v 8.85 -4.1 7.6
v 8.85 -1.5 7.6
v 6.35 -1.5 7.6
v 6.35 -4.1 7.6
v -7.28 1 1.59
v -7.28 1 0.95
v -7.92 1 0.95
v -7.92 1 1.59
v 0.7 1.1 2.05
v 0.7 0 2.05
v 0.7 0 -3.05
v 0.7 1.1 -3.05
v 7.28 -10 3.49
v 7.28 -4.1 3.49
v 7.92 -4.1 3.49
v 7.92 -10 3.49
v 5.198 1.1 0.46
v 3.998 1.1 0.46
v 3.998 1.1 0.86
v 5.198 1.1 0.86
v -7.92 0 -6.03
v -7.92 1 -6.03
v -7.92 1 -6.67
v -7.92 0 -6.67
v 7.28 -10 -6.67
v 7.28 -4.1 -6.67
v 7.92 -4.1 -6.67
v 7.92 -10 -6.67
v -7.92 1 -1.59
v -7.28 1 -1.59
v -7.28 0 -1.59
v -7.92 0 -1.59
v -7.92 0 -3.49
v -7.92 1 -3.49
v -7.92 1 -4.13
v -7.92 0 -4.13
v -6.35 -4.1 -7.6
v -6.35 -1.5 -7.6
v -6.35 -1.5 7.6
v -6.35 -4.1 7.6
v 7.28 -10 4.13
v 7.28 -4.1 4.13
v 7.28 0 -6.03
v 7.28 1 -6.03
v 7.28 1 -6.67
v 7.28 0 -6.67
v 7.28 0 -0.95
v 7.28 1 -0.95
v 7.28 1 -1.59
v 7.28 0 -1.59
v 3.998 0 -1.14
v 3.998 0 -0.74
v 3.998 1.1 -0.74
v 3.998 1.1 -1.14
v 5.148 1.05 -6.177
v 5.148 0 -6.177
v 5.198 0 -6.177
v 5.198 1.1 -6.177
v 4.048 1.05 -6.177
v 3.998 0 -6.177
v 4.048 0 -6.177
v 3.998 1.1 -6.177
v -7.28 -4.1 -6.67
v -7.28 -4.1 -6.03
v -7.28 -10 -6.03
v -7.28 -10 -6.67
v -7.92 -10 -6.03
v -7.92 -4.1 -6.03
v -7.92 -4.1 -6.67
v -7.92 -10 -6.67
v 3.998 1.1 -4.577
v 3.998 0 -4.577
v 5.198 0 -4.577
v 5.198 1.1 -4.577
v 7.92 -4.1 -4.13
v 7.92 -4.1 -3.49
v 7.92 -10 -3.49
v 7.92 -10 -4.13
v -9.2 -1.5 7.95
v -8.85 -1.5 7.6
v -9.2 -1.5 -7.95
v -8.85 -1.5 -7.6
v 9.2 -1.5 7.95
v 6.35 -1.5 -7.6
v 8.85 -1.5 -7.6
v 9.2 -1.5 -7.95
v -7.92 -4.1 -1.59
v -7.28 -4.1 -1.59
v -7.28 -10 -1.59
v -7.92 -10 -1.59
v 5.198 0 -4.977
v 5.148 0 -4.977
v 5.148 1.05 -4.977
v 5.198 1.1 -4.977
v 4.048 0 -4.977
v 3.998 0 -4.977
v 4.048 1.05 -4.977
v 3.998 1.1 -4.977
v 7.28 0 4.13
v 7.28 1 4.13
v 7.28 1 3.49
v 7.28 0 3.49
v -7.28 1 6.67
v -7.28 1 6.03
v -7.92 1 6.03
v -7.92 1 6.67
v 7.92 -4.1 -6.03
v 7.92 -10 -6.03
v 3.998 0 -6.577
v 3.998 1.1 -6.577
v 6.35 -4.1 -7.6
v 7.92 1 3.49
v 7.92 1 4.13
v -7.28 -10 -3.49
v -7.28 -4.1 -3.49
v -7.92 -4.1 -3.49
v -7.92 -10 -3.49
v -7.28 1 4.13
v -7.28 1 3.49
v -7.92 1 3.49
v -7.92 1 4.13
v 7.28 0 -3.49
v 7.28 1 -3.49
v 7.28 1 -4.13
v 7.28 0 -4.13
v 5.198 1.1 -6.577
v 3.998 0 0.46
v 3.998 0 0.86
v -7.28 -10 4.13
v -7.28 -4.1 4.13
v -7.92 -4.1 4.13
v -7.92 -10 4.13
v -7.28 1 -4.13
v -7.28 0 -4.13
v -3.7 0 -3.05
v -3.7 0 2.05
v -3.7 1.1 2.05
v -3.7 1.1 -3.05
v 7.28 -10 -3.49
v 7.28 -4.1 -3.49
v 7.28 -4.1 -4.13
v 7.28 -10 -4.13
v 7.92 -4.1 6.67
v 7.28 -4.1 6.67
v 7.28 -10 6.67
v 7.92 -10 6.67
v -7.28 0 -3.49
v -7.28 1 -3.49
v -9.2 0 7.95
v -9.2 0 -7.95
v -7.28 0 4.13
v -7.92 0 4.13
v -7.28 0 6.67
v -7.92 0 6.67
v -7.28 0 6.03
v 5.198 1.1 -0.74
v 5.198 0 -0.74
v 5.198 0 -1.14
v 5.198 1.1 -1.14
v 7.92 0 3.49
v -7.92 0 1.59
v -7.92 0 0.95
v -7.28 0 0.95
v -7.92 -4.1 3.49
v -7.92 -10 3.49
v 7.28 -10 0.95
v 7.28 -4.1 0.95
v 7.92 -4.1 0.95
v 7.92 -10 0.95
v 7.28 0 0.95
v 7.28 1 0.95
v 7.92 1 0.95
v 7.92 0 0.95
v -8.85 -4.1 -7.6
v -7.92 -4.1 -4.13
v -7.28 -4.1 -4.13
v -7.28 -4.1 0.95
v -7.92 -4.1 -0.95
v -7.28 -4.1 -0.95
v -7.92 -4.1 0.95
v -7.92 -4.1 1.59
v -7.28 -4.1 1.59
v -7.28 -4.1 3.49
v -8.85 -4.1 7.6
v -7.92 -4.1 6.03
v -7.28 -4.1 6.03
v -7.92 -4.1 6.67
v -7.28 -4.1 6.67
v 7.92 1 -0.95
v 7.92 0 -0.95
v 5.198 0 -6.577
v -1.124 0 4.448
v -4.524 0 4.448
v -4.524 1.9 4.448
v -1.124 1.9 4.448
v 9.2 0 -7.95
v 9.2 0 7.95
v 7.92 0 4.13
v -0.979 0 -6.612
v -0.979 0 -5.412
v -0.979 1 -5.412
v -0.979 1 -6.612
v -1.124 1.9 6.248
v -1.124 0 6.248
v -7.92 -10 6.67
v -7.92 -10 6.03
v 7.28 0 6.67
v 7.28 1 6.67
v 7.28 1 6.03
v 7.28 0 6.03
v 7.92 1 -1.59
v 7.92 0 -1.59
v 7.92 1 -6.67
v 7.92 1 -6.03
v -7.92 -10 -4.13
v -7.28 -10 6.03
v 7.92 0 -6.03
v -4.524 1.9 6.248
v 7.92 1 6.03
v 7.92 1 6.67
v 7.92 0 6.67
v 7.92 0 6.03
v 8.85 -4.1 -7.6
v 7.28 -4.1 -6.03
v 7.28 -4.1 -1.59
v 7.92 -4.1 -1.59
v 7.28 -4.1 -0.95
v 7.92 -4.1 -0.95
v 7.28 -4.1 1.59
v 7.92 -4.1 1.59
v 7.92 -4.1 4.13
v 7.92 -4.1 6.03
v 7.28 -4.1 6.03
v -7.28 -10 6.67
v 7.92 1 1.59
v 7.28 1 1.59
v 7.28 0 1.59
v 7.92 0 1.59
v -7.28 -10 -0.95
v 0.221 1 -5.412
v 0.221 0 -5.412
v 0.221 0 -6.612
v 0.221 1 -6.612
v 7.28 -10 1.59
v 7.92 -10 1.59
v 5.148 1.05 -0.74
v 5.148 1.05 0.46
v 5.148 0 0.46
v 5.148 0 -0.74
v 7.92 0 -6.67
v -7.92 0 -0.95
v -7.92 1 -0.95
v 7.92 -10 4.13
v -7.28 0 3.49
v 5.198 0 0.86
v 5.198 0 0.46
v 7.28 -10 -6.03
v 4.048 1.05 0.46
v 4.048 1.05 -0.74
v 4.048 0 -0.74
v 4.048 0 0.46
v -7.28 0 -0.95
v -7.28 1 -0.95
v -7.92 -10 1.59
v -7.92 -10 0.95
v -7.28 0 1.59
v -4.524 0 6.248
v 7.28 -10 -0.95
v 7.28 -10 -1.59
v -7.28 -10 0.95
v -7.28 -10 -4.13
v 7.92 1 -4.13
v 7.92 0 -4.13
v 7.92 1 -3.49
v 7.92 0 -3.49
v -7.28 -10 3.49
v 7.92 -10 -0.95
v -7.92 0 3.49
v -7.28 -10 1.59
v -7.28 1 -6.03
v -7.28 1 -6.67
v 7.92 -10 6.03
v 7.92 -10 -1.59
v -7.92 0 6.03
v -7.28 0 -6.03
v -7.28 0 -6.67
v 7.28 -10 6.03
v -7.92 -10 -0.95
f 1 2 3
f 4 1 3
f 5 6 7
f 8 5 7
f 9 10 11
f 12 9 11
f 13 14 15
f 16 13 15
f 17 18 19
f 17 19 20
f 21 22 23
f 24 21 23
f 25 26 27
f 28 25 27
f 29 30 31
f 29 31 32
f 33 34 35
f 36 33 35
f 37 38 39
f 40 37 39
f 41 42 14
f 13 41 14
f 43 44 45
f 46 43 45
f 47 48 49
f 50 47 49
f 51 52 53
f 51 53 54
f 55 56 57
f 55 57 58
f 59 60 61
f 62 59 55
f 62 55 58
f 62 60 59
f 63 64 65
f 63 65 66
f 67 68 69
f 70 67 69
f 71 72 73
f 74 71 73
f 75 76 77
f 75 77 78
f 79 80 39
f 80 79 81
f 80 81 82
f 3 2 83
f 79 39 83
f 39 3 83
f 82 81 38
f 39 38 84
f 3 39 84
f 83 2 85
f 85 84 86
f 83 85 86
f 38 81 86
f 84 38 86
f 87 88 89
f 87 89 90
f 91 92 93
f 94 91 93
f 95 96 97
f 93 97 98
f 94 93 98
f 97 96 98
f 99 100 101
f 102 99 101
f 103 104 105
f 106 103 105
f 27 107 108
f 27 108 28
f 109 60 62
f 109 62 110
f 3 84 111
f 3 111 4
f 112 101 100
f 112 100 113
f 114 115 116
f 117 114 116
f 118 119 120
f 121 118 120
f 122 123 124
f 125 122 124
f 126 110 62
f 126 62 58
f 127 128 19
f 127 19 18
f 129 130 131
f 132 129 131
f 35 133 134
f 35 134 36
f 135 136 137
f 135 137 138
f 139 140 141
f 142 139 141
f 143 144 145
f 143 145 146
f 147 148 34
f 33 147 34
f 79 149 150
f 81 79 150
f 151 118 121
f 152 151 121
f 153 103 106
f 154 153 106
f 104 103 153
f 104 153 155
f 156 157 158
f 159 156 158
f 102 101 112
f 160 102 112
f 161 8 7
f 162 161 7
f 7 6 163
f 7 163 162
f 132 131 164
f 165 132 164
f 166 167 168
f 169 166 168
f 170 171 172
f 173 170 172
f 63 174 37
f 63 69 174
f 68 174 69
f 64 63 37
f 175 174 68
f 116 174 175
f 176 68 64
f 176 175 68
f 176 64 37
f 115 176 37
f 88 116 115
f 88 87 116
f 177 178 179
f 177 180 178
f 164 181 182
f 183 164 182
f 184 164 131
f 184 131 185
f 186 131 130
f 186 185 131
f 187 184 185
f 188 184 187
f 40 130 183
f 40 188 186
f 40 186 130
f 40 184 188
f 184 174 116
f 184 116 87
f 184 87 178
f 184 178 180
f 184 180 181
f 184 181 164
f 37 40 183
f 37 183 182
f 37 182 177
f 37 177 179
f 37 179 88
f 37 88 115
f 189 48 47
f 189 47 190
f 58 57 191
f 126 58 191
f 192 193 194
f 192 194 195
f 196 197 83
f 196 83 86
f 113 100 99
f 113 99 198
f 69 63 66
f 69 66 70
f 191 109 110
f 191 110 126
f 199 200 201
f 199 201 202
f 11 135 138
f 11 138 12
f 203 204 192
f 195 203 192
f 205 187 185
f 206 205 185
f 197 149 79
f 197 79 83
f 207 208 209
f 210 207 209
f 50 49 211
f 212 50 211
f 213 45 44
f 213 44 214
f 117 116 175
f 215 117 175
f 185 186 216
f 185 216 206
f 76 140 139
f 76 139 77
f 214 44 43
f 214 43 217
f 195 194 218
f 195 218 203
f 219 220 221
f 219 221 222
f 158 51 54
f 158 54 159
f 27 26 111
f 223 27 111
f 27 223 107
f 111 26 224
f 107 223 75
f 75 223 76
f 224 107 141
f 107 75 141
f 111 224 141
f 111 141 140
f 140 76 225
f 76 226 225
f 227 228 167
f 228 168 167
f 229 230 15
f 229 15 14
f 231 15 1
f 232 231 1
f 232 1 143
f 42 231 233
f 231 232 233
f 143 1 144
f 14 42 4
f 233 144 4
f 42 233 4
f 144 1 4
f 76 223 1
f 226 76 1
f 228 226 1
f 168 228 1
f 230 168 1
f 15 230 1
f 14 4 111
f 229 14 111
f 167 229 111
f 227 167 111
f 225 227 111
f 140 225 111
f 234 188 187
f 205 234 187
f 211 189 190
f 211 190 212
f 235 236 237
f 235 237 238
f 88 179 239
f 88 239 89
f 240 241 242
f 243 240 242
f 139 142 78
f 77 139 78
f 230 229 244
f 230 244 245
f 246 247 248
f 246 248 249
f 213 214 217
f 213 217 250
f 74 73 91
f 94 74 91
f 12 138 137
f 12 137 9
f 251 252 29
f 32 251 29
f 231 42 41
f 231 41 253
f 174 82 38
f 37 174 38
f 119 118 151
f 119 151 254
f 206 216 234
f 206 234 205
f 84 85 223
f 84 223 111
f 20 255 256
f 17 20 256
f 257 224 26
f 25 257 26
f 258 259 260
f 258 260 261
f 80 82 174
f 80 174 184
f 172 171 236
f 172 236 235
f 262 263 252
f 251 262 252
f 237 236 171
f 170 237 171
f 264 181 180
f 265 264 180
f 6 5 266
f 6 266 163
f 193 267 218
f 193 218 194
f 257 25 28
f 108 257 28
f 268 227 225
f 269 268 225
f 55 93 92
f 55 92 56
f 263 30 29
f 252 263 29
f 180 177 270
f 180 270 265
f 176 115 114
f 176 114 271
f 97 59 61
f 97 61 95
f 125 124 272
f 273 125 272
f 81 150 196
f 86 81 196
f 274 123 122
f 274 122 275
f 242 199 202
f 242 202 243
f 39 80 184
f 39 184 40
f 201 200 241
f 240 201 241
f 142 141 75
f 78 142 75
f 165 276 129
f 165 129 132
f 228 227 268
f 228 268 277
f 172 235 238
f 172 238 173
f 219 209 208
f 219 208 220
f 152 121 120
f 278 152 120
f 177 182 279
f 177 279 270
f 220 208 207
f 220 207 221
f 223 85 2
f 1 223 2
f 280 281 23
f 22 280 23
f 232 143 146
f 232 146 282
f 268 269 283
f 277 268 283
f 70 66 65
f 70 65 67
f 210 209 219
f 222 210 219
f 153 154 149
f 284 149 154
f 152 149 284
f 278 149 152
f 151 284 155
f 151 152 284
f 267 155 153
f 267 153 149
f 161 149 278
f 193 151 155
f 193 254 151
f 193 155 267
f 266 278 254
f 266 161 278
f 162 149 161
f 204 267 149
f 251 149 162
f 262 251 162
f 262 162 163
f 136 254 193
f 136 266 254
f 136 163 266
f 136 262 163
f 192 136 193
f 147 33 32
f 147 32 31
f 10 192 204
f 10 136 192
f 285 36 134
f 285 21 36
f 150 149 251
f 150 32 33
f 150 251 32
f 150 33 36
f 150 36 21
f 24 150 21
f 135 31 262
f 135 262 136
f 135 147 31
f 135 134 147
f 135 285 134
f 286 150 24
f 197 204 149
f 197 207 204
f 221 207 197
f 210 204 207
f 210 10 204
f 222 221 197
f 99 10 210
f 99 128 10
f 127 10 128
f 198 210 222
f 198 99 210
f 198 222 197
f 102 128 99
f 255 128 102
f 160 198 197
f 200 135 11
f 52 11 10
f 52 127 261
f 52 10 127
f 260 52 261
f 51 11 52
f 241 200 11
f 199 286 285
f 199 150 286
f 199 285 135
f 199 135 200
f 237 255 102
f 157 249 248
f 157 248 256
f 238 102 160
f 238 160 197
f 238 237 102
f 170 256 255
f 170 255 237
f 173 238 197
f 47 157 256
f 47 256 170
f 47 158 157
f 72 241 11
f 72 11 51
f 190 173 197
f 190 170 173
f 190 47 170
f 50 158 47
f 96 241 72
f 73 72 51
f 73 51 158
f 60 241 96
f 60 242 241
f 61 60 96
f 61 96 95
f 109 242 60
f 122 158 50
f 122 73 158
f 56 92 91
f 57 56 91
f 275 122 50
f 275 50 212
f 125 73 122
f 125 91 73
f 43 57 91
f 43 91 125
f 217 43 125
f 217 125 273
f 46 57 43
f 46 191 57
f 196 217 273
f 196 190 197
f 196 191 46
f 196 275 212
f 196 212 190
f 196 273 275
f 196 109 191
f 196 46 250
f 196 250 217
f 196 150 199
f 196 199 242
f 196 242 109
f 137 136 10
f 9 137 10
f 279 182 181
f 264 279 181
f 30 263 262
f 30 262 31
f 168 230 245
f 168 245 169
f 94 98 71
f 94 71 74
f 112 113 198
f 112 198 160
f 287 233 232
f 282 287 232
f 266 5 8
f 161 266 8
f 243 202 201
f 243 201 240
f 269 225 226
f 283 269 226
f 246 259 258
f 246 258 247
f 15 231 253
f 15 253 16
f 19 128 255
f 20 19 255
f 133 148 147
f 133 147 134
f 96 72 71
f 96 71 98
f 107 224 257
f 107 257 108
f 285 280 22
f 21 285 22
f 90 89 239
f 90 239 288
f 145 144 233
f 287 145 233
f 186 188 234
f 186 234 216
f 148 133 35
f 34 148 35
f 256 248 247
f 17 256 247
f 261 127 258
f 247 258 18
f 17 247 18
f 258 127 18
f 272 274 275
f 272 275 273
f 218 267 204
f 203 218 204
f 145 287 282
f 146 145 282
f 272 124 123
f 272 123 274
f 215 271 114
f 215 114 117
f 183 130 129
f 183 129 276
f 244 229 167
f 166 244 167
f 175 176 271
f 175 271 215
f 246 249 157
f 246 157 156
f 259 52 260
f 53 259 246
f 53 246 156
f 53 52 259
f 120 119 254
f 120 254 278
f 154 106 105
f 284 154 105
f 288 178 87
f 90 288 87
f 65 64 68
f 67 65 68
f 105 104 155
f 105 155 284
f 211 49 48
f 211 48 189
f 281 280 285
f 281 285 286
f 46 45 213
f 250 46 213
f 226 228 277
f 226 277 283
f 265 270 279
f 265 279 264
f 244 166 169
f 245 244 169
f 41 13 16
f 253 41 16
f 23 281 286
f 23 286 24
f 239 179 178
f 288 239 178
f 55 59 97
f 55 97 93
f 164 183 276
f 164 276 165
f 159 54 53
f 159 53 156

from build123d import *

# Parameters (mm, degrees)
SKETCH1_W           = 18.4
SKETCH1_H           = 15.9
BOSS_EXTRUDE1_DEPTH = 1.5
SKETCH2_W           = 2.5
SKETCH2_H           = 15.2
BOSS_EXTRUDE2_DEPTH = 2.6
BOSS_EXTRUDE3_START = -5.1
SKETCH3_W           = 0.64
SKETCH3_H           = 0.64
BOSS_EXTRUDE3_DEPTH = 11
SKETCH5_W           = 4.4
SKETCH5_H           = 5.1
SKETCH5_W_2         = 1.2
SKETCH5_H_2         = 2
BOSS_EXTRUDE4_DEPTH = 1.1
SKETCH6_W           = 1.2
SKETCH6_H           = 1.2
BOSS_EXTRUDE5_DEPTH = 1
SKETCH7_W           = 3.4
SKETCH7_H           = 1.8
BOSS_EXTRUDE6_DEPTH = 1.9
SKETCH8_W           = 1.2
SKETCH8_H           = 1.2
CUT_EXTRUDE1_DEPTH  = 0.05
SKETCH9_W           = 1.2
SKETCH9_H           = 1.05
CUT_EXTRUDE2_DEPTH  = 0.05
SKETCH10_W          = 1.2
SKETCH10_H          = 1.05
CUT_EXTRUDE3_DEPTH  = 0.05


with BuildPart() as part:
    # Sketch1 → Boss-Extrude1 (new body)
    with BuildSketch(Plane(origin=(0, 0, 0), x_dir=(1, 0, 0), z_dir=(0, 1, 0))):
        Rectangle(SKETCH1_W, SKETCH1_H)
    extrude(amount=-BOSS_EXTRUDE1_DEPTH)

    # Sketch2 → Boss-Extrude2 (add)
    with BuildSketch(Plane.XZ.offset(1.5)):
        with Locations((-7.6, 0)):
            Rectangle(SKETCH2_W, SKETCH2_H)
    boss_extrude2 = extrude(amount=BOSS_EXTRUDE2_DEPTH)

    # Sketch3 → Boss-Extrude3 (add)
    with BuildSketch(Plane(origin=(0, -4.1, 0), x_dir=(-1, 0, 0), z_dir=(0, -1, 0)).offset(BOSS_EXTRUDE3_START)):
        with Locations((7.6, -6.35)):
            Rectangle(SKETCH3_W, SKETCH3_H)
        with Locations((7.6, -3.81)):
            Rectangle(SKETCH3_W, SKETCH3_H)
        with Locations((7.6, -1.27)):
            Rectangle(SKETCH3_W, SKETCH3_H)
        with Locations((7.6, 1.27)):
            Rectangle(SKETCH3_W, SKETCH3_H)
        with Locations((7.6, 6.35)):
            Rectangle(SKETCH3_W, SKETCH3_H)
        with Locations((7.6, 3.81)):
            Rectangle(SKETCH3_W, SKETCH3_H)
    boss_extrude3 = extrude(amount=BOSS_EXTRUDE3_DEPTH)

    # Mirror1: Boss-Extrude2, Boss-Extrude3 across plane
    add(boss_extrude2.mirror(Plane(origin=(0, 0, 0), x_dir=(0, 0, 1), z_dir=(1, 0, 0))))
    add(boss_extrude3.mirror(Plane(origin=(0, 0, 0), x_dir=(0, 0, 1), z_dir=(1, 0, 0))))

    # Sketch5 → Boss-Extrude4 (add)
    with BuildSketch(Plane(origin=(0, 0, 0), x_dir=(1, 0, 0), z_dir=(0, 1, 0))):
        with Locations((-1.5, 0.5)):
            Rectangle(SKETCH5_W, SKETCH5_H)
        with Locations((4.5979, 0.1395)):
            Rectangle(SKETCH5_W_2, SKETCH5_H_2)
        with Locations((4.5979, 5.5766)):
            Rectangle(SKETCH5_W_2, SKETCH5_H_2)
    extrude(amount=BOSS_EXTRUDE4_DEPTH)

    # Sketch6 → Boss-Extrude5 (add)
    with BuildSketch(Plane(origin=(0, 0, 0), x_dir=(1, 0, 0), z_dir=(0, 1, 0))):
        with Locations((-0.3788, 6.0122)):
            Rectangle(SKETCH6_W, SKETCH6_H)
    extrude(amount=BOSS_EXTRUDE5_DEPTH)

    # Sketch7 → Boss-Extrude6 (add)
    with BuildSketch(Plane(origin=(0, 0, 0), x_dir=(1, 0, 0), z_dir=(0, 1, 0))):
        with Locations((-2.8238, -5.3484)):
            Rectangle(SKETCH7_W, SKETCH7_H)
    extrude(amount=BOSS_EXTRUDE6_DEPTH)

    # Sketch8 → Cut-Extrude1 (cut)
    with BuildSketch(Plane(origin=(0, 1.1, 0), x_dir=(1, 0, 0), z_dir=(0, 1, 0))):
        with Locations((4.5979, 5.5766)):
            Rectangle(SKETCH8_W, SKETCH8_H)
        with Locations((4.5979, 0.1395)):
            Rectangle(SKETCH8_W, SKETCH8_H)
    extrude(amount=-CUT_EXTRUDE1_DEPTH, mode=Mode.SUBTRACT)

    # Sketch9 → Cut-Extrude2 (cut)
    with BuildSketch(Plane.ZY.offset(-3.9979)):
        with Locations((-0.1395, 0.525)):
            Rectangle(SKETCH9_W, SKETCH9_H)
        with Locations((-5.5766, 0.525)):
            Rectangle(SKETCH9_W, SKETCH9_H)
    extrude(amount=-CUT_EXTRUDE2_DEPTH, mode=Mode.SUBTRACT)

    # Sketch10 → Cut-Extrude3 (cut)
    with BuildSketch(Plane(origin=(5.1979, 0, 0), x_dir=(0, 0, -1), z_dir=(1, 0, 0))):
        with Locations((0.1395, 0.525)):
            Rectangle(SKETCH10_W, SKETCH10_H)
        with Locations((5.5766, 0.525)):
            Rectangle(SKETCH10_W, SKETCH10_H)
    extrude(amount=-CUT_EXTRUDE3_DEPTH, mode=Mode.SUBTRACT)


solid = part.part
